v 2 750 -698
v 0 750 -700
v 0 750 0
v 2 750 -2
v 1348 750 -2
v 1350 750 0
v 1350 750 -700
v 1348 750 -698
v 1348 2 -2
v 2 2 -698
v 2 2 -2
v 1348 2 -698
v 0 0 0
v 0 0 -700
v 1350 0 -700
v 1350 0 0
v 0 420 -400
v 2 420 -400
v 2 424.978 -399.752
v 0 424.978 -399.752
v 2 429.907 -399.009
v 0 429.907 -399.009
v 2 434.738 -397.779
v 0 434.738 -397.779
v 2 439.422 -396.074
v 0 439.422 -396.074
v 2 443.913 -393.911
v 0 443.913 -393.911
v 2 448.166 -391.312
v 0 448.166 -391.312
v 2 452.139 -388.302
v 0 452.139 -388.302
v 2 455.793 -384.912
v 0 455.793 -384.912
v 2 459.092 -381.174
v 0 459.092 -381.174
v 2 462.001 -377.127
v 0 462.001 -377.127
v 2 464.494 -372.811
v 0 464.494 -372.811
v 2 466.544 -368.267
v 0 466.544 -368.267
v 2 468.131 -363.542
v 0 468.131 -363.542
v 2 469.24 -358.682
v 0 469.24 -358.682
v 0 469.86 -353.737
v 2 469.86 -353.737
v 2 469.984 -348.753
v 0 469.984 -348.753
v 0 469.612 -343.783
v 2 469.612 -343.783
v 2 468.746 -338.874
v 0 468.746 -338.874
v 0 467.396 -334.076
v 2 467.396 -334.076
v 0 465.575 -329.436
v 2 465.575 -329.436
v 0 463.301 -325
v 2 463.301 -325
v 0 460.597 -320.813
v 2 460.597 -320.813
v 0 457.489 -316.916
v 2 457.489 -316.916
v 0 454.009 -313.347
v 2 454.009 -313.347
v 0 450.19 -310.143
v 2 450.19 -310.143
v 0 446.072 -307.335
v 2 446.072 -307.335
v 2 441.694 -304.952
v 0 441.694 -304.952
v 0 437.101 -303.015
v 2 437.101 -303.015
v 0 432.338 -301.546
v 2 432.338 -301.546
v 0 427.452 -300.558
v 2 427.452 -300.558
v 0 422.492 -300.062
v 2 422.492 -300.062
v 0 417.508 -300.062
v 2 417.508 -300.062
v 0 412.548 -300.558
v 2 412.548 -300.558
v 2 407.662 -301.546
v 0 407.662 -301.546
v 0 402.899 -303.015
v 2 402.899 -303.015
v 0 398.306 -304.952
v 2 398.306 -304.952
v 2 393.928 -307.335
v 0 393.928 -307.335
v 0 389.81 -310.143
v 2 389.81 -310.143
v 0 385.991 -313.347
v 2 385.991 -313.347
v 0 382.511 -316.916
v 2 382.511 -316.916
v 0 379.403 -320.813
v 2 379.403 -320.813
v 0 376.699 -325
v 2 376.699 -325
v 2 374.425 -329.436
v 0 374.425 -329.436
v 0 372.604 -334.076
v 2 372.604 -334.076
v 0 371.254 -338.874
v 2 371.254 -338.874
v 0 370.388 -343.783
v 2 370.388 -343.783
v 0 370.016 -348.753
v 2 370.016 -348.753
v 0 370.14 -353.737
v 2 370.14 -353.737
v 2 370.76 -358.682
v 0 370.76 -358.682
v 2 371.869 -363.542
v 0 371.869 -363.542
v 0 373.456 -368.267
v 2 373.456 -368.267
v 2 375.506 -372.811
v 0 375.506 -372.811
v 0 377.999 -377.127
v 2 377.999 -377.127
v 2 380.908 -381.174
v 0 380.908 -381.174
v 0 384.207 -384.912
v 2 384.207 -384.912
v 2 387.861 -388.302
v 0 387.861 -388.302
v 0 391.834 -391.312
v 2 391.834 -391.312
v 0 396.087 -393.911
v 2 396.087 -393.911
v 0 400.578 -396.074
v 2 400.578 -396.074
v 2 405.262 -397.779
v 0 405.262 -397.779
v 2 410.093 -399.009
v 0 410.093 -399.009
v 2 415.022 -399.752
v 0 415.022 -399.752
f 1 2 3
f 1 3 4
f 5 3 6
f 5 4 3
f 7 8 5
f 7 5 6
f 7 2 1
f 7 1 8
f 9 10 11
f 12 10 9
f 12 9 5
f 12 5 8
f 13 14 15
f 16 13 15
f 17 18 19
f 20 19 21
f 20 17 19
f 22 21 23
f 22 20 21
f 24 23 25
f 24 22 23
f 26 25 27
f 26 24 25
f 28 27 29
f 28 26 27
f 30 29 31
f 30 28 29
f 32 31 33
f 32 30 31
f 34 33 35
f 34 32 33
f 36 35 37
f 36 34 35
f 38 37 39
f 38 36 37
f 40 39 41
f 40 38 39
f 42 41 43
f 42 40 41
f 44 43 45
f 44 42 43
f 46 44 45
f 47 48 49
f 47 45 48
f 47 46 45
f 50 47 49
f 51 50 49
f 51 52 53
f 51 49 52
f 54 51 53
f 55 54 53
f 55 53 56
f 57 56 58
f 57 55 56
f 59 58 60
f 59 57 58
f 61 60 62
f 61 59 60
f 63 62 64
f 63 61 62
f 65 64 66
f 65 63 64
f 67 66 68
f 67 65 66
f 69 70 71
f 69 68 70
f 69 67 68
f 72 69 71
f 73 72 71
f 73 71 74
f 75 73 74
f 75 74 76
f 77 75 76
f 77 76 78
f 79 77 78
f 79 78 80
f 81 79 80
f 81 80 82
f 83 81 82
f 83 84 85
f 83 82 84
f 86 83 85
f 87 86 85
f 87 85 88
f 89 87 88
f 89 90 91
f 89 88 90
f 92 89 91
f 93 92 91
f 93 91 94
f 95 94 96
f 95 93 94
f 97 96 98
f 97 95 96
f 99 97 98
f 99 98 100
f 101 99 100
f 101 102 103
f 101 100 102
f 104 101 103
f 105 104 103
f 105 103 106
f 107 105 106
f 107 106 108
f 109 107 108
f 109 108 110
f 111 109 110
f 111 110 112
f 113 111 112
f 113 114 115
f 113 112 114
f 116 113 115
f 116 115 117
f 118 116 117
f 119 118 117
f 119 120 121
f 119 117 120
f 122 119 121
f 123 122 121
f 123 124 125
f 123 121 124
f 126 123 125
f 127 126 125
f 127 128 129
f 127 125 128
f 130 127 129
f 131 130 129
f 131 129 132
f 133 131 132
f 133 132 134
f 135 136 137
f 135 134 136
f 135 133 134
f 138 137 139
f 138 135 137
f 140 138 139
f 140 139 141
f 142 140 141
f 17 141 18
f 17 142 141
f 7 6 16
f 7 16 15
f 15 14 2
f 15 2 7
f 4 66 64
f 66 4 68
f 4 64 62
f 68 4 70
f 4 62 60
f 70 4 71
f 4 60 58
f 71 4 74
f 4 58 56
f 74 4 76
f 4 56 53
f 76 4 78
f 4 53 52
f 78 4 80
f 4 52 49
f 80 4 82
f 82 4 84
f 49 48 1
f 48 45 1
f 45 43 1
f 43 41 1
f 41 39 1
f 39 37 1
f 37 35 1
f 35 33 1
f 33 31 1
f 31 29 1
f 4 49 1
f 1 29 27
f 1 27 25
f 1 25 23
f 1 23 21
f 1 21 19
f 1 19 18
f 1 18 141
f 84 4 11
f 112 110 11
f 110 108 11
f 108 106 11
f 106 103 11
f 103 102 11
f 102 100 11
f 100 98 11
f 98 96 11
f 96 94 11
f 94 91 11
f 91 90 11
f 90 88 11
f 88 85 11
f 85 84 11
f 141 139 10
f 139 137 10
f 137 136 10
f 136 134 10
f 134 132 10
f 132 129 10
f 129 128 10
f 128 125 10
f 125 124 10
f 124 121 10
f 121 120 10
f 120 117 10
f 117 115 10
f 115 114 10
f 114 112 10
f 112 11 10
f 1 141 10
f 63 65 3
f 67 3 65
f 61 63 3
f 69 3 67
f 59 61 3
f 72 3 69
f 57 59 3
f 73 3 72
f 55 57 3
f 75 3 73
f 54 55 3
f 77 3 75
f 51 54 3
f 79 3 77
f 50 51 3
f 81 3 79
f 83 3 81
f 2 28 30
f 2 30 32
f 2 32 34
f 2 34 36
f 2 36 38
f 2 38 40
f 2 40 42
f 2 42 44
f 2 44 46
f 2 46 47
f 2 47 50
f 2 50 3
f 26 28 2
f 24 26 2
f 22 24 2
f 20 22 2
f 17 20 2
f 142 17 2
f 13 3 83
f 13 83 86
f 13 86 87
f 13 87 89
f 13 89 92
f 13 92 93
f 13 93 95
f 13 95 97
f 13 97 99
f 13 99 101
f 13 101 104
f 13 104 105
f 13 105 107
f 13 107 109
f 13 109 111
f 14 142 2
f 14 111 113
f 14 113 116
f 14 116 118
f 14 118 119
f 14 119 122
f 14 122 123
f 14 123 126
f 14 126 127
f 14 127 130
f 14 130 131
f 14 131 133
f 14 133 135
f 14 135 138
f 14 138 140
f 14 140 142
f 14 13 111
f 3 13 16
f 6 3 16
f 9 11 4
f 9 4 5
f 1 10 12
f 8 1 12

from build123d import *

# Parameters (mm, degrees)
MASTER_FOOTPRINT_W    = 1350
MASTER_FOOTPRINT_H    = 700
BATH_BASE_PLATE_DEPTH = 750
BATH_SHELL_2MM_T      = -2
SKETCH_1_R            = 50
INLET_D100_CUT_DEPTH  = 10


with BuildPart() as part:
    # MASTER_FOOTPRINT → BATH_BASE_PLATE (new body)
    with BuildSketch(Plane(origin=(0, 0, 0), x_dir=(1, 0, 0), z_dir=(0, 1, 0))):
        with Locations((675, 350)):
            Rectangle(MASTER_FOOTPRINT_W, MASTER_FOOTPRINT_H)
    extrude(amount=BATH_BASE_PLATE_DEPTH)

    # BATH_SHELL_2MM
    bath_shell_2mm_openings = [part.faces().sort_by_distance(p)[0] for p in [
        (675, 750, -350),
    ]]
    offset(amount=BATH_SHELL_2MM_T, openings=bath_shell_2mm_openings, kind=Kind.INTERSECTION)

    # Эскиз1 → INLET_D100_CUT (cut)
    with BuildSketch(Plane(origin=(0, 0, 0), x_dir=(0, 0, -1), z_dir=(1, 0, 0))):
        with Locations((350, 420)):
            Circle(SKETCH_1_R)
    extrude(amount=INLET_D100_CUT_DEPTH, mode=Mode.SUBTRACT)


solid = part.part
